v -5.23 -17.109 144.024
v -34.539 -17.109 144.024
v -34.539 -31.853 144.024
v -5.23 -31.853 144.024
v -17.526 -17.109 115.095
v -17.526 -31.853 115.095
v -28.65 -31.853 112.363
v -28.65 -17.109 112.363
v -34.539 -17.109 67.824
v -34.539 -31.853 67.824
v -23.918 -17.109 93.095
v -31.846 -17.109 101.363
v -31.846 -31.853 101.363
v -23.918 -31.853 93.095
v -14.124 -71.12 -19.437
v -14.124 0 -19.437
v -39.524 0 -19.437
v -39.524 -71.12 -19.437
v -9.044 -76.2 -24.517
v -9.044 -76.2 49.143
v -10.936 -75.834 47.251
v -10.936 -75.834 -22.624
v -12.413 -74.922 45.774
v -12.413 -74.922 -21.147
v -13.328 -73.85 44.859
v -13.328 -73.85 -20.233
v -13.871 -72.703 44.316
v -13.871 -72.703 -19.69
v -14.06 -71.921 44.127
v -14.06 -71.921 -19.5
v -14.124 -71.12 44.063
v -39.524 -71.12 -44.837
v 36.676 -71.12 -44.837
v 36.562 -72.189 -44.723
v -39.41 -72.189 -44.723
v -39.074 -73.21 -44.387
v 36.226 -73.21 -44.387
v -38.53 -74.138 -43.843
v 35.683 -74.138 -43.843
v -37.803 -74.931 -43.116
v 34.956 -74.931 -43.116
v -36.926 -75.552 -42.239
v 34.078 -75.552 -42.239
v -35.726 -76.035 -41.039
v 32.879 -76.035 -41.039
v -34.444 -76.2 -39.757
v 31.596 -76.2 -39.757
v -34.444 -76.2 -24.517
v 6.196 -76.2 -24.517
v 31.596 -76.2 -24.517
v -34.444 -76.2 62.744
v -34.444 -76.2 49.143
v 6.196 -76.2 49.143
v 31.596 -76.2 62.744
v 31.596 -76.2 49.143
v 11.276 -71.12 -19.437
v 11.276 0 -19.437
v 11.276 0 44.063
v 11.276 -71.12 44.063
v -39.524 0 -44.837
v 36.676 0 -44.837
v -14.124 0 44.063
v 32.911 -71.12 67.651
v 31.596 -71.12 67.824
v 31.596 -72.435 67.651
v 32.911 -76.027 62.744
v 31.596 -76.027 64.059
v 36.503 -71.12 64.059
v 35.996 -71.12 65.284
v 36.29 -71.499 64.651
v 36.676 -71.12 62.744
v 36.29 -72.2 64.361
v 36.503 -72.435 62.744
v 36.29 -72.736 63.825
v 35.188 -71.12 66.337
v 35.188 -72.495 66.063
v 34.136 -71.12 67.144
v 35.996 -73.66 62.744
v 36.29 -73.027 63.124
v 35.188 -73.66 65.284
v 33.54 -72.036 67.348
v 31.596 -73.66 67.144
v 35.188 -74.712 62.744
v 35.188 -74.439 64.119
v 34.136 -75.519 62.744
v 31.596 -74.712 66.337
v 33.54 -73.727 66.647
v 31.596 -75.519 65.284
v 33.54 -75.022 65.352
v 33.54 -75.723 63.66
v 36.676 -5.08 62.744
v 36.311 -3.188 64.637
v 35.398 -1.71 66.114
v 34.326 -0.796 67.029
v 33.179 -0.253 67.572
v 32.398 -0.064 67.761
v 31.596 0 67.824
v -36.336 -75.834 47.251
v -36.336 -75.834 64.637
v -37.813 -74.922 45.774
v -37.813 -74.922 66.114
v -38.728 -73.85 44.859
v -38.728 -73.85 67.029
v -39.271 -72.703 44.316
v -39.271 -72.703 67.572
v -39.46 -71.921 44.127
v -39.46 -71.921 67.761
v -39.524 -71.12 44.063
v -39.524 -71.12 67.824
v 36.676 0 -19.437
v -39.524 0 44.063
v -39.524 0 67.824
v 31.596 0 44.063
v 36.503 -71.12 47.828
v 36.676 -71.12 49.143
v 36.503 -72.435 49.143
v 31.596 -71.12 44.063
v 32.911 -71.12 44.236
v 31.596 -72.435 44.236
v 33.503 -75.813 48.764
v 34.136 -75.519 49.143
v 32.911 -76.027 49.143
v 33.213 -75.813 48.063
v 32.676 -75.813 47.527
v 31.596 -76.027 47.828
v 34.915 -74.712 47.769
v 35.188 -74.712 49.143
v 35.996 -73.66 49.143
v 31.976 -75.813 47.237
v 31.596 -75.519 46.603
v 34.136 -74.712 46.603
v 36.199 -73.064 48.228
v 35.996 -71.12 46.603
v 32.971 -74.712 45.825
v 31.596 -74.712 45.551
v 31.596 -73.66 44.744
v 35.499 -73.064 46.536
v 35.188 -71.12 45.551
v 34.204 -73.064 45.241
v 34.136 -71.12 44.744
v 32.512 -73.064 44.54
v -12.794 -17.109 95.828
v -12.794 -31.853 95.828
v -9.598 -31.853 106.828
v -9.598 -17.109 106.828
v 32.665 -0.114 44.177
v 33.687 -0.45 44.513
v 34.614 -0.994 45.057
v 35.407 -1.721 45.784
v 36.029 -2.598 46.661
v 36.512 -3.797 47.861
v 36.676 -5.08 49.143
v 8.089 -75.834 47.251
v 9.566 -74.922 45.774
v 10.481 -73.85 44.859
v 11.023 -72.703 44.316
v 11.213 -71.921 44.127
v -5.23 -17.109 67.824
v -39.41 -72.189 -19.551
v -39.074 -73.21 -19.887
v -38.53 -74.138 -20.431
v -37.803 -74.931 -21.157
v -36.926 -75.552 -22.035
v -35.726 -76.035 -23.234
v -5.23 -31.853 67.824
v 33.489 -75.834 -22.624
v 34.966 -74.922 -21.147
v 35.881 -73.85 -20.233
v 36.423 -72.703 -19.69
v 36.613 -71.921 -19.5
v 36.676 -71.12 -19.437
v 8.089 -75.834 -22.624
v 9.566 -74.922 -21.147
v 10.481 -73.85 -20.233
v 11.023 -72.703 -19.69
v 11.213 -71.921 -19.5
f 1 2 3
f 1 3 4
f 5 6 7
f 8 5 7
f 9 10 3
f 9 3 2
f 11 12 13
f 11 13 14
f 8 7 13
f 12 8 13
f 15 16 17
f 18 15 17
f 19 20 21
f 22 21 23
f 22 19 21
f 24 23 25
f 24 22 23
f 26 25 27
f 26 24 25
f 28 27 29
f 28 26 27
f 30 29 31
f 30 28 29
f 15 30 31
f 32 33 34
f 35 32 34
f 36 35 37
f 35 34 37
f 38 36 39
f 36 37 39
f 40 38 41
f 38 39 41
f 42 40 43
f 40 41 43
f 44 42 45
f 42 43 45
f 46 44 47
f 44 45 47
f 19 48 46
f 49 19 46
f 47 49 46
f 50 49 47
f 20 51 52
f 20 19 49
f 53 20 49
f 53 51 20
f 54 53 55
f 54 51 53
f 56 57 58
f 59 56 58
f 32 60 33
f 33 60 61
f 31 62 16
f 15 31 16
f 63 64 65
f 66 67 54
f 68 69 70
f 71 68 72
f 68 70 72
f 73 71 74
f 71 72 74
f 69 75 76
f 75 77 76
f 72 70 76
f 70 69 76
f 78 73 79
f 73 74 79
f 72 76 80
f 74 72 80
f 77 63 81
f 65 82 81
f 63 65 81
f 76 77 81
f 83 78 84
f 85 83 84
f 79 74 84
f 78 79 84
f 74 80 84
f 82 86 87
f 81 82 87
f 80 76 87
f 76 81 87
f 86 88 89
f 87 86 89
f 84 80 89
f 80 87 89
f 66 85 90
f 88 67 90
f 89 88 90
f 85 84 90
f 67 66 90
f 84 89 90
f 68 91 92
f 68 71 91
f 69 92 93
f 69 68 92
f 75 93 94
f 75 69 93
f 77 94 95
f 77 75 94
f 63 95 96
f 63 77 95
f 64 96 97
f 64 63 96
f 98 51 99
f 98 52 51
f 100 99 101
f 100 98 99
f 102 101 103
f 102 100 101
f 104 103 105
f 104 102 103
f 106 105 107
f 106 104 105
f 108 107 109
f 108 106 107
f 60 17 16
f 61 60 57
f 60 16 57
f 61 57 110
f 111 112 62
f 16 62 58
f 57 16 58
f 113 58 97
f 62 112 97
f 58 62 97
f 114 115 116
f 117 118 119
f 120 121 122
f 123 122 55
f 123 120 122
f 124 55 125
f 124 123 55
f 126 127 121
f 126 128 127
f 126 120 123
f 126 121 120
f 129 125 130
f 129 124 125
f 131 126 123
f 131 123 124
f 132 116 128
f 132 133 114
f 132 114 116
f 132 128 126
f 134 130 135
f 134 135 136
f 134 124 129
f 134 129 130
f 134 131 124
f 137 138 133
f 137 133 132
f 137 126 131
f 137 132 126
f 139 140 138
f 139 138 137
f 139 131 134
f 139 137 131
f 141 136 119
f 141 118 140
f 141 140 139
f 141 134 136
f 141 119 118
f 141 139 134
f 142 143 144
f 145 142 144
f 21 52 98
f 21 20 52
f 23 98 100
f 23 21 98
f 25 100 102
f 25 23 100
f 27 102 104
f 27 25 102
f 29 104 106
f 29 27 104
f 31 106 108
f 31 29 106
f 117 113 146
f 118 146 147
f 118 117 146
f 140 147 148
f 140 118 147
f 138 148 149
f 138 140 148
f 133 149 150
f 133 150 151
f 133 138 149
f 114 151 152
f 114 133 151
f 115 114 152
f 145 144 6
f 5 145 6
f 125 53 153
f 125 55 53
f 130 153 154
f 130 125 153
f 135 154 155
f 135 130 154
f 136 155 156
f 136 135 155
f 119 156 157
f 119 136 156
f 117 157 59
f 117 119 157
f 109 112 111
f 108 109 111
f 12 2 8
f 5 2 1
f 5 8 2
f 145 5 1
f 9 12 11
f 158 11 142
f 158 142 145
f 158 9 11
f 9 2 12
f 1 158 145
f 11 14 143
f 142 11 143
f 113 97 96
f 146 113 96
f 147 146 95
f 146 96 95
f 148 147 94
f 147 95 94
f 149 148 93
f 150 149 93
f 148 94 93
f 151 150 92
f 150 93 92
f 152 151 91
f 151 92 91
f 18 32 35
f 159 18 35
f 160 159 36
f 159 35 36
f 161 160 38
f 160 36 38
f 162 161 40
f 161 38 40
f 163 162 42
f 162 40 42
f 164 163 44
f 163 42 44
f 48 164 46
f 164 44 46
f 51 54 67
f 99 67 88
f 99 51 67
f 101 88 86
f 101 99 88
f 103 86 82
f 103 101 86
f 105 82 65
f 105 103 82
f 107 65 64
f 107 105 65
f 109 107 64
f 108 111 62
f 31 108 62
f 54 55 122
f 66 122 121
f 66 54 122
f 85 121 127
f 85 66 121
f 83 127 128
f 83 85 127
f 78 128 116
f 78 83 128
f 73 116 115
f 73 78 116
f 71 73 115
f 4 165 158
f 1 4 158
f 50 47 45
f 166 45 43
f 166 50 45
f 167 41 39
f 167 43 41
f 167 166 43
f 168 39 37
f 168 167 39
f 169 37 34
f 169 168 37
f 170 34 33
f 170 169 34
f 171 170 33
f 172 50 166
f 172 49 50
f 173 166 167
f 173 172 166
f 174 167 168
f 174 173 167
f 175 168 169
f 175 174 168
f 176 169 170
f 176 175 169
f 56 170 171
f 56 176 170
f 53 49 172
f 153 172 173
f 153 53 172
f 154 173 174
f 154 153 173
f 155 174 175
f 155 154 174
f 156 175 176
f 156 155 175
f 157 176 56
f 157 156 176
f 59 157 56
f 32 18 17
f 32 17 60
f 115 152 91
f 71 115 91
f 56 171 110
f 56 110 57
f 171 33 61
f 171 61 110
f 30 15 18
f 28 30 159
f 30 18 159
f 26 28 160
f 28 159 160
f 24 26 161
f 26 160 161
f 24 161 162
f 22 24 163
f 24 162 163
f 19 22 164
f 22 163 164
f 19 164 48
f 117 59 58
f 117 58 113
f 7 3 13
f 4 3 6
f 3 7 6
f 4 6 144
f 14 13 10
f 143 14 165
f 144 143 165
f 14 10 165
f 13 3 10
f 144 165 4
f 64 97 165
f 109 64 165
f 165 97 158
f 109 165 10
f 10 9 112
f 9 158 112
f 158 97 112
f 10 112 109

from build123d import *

# Parameters (mm, degrees)
F1_DEPTH = 76.2
F2_W     = 29.3097225949
F2_H     = 14.7436801344
F3_DEPTH = 76.2
F5_DEPTH = 31.8535955081
F6_R     = 5.08


with BuildPart() as f1:
    # F0 (on Front) → F1 (new body)
    with BuildSketch(Plane.XZ):
        Polygon((-39.5237128198, -19.4368070878), (-39.5237128198, -44.8368070878), (36.6762871802, -44.8368070878), (36.6762871802, -19.4368070878), (11.2762871802, -19.4368070878), (11.2762871802, 44.0631929122), (36.6762871802, 44.0631929122), (36.6762871802, 67.8244820096), (-39.5237128198, 67.8244820096), (-39.5237128198, 44.0631929122), (-14.1237131261, 44.0631929122), (-14.1237131261, -19.4368070878), align=None)
    extrude(amount=F1_DEPTH)

    # F2 (on face) → F3 (join)
    with BuildSketch(Plane.XY.offset(67.8244820096)):
        with Locations((-19.8845365085, -24.4807554409)):
            Rectangle(F2_W, F2_H)
    extrude(amount=F3_DEPTH)

    # F4 (on face) → F5 (cut, through all)
    with BuildSketch(Plane.XZ.offset(31.8525955081)):
        Polygon((-17.5263217899, 115.0952721356), (-28.6504694012, 112.3630260708), (-31.8463487054, 101.3631086114), (-23.9180803982, 93.0954372169), (-12.7939327868, 95.8276832817), (-9.5980534826, 106.8276007411), align=None)
    extrude(amount=-F5_DEPTH, mode=Mode.SUBTRACT)

    # F6
    f6_edges = [f1.edges().sort_by_distance(p)[0] for p in [
        (-1.423713, -76.2, 67.824482),
        (36.676287, -38.1, 67.824482),
        (36.676287, -38.1, 44.063193),
        (36.676287, 0, 55.943837),
        (36.676287, -76.2, 55.943837),
        (-26.823713, -76.2, 44.063193),
        (-14.123713, -76.2, 12.313193),
        (-26.823713, -76.2, -19.436807),
        (-39.523713, -76.2, -32.136807),
        (-1.423713, -76.2, -44.836807),
        (36.676287, -76.2, -32.136807),
        (23.976287, -76.2, -19.436807),
        (11.276287, -76.2, 12.313193),
        (23.976287, -76.2, 44.063193),
        (-39.523713, -76.2, 55.943837),
    ]]
    fillet(f6_edges, radius=F6_R)


solid = f1.part
